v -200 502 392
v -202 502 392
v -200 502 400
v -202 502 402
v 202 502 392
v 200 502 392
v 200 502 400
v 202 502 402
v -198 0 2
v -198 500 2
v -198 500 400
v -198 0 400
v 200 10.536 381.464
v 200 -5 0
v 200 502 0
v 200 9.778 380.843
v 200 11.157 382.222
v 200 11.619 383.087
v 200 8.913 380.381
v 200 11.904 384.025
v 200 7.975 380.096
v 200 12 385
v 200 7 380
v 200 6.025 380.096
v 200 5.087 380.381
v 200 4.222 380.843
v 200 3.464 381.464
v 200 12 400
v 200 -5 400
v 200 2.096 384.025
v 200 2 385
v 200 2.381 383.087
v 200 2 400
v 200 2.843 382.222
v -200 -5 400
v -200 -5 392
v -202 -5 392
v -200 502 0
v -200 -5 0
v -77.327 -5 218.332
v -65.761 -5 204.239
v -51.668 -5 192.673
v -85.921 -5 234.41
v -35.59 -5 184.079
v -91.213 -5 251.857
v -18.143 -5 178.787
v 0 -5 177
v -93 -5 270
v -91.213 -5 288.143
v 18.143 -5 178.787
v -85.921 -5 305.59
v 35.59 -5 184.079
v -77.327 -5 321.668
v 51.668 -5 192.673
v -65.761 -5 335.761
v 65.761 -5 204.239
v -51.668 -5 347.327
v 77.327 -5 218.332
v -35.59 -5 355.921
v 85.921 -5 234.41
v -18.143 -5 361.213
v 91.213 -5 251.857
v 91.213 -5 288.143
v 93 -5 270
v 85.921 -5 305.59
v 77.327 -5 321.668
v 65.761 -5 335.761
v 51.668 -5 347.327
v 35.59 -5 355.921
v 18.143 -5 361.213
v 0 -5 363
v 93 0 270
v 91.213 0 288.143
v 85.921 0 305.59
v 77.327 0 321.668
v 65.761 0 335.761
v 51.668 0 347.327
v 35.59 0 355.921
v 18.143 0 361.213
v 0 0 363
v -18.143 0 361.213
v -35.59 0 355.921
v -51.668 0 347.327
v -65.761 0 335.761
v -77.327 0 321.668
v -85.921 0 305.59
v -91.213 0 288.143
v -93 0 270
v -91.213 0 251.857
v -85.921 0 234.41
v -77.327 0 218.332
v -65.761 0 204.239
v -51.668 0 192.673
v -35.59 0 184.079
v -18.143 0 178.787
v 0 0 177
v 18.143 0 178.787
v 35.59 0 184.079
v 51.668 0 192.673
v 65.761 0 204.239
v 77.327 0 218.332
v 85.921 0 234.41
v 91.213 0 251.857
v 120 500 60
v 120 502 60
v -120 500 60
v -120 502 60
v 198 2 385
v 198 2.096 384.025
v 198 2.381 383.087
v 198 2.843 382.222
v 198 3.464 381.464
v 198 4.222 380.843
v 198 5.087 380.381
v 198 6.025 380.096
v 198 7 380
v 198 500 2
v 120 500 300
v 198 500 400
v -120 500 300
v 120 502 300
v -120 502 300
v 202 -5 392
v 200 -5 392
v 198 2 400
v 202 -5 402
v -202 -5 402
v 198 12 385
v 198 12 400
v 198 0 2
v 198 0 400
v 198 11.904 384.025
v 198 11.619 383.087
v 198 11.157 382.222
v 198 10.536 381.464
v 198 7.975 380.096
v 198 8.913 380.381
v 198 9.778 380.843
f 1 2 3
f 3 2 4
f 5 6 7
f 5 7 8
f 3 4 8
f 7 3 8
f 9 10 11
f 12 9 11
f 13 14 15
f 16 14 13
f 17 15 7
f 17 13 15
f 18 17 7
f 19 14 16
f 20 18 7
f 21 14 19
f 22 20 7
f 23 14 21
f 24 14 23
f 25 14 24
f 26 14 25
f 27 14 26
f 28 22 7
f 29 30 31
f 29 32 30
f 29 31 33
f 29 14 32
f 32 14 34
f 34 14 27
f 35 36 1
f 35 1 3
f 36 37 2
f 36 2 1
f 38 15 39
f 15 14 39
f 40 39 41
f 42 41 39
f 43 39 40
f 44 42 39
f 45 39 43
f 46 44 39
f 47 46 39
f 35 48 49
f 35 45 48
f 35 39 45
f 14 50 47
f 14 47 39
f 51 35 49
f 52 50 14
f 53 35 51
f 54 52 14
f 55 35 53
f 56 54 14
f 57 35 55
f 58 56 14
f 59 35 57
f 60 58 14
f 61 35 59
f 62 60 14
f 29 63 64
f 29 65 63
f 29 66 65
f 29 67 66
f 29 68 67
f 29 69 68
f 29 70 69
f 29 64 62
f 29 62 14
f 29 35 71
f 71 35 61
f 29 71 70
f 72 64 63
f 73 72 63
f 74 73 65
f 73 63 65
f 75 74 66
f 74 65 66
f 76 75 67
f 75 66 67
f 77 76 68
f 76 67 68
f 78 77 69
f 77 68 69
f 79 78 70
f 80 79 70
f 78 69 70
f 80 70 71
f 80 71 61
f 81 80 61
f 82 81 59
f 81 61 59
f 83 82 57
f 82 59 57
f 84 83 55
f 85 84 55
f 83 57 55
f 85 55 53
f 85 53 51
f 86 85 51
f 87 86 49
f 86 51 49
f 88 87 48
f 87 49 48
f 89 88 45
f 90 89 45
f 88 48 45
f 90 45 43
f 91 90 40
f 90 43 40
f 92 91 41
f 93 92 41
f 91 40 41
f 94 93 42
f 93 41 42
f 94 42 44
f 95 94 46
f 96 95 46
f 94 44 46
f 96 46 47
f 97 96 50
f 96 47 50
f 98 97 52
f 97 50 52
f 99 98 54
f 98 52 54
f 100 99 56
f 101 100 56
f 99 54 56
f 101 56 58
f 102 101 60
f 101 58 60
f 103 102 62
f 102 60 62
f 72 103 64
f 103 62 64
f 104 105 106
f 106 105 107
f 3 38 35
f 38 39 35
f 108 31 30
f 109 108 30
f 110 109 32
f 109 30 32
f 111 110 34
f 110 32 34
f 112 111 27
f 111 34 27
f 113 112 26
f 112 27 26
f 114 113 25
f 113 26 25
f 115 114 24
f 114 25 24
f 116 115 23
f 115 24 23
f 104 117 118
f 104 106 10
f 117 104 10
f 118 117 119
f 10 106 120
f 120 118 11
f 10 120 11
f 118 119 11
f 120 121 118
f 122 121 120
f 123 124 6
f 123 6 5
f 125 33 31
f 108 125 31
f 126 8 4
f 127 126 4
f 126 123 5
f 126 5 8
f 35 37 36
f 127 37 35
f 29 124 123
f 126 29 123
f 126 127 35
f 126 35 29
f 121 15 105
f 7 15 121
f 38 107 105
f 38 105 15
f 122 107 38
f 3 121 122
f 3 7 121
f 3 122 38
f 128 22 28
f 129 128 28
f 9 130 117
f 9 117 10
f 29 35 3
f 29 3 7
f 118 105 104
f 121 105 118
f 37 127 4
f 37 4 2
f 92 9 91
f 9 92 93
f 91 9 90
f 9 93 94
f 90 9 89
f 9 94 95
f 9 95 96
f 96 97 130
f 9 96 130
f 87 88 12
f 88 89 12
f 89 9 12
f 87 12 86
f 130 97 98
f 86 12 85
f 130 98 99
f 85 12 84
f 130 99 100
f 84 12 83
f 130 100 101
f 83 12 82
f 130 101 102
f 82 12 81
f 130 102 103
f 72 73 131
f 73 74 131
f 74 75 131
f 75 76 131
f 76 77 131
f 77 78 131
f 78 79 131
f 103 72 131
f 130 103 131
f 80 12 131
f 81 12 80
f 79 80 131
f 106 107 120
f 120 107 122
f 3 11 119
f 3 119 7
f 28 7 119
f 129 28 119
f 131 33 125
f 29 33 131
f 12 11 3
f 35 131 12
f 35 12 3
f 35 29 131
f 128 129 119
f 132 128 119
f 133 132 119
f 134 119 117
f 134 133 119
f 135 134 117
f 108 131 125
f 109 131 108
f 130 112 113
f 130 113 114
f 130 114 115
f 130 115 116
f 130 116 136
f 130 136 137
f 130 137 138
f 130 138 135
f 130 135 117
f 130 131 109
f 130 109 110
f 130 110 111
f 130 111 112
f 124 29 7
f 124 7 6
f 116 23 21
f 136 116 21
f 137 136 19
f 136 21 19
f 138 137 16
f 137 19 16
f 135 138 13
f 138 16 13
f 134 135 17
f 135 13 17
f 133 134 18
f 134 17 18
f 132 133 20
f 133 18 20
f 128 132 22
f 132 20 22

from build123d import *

# Parameters (mm, degrees)
F1_DEPTH  = 500
F2_W      = 400
F2_H      = 400
F3_DEPTH  = 5
F4_R      = 93
F5_DEPTH  = 5
F7_DEPTH  = 2
F8_W      = 400
F8_H      = 400
F9_DEPTH  = 2
F10_W     = 240
F10_H     = 240
F11_DEPTH = 2
F13_DEPTH = 507


with BuildPart() as f1:
    # F0 (on Front) → F1 (new body)
    with BuildSketch(Plane.XZ):
        Polygon((-200, 0), (200, 0), (200, 400), (198, 400), (198, 2), (-198, 2), (-198, 400), (-200, 400), align=None)
    extrude(amount=-F1_DEPTH)

    # F2 (on face) → F3 (join)
    with BuildSketch(Plane.XZ):
        with Locations((0, 200)):
            Rectangle(F2_W, F2_H)
    extrude(amount=F3_DEPTH)

    # F4 (on face) → F5 (cut, through all)
    with BuildSketch(Plane.XZ.offset(5)):
        with Locations((0, 270)):
            Circle(F4_R)
    extrude(amount=-F5_DEPTH, mode=Mode.SUBTRACT)

    # F6 (on face) → F7 (cut, through all)
    with BuildSketch(Plane.YZ.offset(200)):
        with BuildLine():
            Line((12, 400), (2, 400))
            Line((2, 400), (2, 385))
            ThreePointArc((2, 385), (3.4644660941, 381.4644660941), (7, 380))
            ThreePointArc((7, 380), (10.5355339059, 381.4644660941), (12, 385))
            Line((12, 385), (12, 400))
        make_face()
    extrude(amount=-F7_DEPTH, mode=Mode.SUBTRACT)

    # F8 (on face) → F9 (join)
    with BuildSketch(Plane(origin=(0, 500, 0), x_dir=(-1, 0, 0), z_dir=(0, 1, 0))):
        with Locations((0, 200)):
            Rectangle(F8_W, F8_H)
    extrude(amount=F9_DEPTH)

    # F10 (on face) → F11 (cut, through all)
    with BuildSketch(Plane(origin=(0, 502, 0), x_dir=(-1, 0, 0), z_dir=(0, 1, 0))):
        with Locations((0, 180)):
            Rectangle(F10_W, F10_H)
    extrude(amount=-F11_DEPTH, mode=Mode.SUBTRACT)


with BuildPart() as f13:
    # F12 (on face) → F13 (new body, through all)
    with BuildSketch(Plane.XZ.offset(5)):
        Polygon((-200, 392), (-200, 400), (200, 400), (200, 392), (202, 392), (202, 402), (-202, 402), (-202, 392), align=None)
    extrude(amount=-F13_DEPTH)


solid = Compound([f1.part, f13.part])
